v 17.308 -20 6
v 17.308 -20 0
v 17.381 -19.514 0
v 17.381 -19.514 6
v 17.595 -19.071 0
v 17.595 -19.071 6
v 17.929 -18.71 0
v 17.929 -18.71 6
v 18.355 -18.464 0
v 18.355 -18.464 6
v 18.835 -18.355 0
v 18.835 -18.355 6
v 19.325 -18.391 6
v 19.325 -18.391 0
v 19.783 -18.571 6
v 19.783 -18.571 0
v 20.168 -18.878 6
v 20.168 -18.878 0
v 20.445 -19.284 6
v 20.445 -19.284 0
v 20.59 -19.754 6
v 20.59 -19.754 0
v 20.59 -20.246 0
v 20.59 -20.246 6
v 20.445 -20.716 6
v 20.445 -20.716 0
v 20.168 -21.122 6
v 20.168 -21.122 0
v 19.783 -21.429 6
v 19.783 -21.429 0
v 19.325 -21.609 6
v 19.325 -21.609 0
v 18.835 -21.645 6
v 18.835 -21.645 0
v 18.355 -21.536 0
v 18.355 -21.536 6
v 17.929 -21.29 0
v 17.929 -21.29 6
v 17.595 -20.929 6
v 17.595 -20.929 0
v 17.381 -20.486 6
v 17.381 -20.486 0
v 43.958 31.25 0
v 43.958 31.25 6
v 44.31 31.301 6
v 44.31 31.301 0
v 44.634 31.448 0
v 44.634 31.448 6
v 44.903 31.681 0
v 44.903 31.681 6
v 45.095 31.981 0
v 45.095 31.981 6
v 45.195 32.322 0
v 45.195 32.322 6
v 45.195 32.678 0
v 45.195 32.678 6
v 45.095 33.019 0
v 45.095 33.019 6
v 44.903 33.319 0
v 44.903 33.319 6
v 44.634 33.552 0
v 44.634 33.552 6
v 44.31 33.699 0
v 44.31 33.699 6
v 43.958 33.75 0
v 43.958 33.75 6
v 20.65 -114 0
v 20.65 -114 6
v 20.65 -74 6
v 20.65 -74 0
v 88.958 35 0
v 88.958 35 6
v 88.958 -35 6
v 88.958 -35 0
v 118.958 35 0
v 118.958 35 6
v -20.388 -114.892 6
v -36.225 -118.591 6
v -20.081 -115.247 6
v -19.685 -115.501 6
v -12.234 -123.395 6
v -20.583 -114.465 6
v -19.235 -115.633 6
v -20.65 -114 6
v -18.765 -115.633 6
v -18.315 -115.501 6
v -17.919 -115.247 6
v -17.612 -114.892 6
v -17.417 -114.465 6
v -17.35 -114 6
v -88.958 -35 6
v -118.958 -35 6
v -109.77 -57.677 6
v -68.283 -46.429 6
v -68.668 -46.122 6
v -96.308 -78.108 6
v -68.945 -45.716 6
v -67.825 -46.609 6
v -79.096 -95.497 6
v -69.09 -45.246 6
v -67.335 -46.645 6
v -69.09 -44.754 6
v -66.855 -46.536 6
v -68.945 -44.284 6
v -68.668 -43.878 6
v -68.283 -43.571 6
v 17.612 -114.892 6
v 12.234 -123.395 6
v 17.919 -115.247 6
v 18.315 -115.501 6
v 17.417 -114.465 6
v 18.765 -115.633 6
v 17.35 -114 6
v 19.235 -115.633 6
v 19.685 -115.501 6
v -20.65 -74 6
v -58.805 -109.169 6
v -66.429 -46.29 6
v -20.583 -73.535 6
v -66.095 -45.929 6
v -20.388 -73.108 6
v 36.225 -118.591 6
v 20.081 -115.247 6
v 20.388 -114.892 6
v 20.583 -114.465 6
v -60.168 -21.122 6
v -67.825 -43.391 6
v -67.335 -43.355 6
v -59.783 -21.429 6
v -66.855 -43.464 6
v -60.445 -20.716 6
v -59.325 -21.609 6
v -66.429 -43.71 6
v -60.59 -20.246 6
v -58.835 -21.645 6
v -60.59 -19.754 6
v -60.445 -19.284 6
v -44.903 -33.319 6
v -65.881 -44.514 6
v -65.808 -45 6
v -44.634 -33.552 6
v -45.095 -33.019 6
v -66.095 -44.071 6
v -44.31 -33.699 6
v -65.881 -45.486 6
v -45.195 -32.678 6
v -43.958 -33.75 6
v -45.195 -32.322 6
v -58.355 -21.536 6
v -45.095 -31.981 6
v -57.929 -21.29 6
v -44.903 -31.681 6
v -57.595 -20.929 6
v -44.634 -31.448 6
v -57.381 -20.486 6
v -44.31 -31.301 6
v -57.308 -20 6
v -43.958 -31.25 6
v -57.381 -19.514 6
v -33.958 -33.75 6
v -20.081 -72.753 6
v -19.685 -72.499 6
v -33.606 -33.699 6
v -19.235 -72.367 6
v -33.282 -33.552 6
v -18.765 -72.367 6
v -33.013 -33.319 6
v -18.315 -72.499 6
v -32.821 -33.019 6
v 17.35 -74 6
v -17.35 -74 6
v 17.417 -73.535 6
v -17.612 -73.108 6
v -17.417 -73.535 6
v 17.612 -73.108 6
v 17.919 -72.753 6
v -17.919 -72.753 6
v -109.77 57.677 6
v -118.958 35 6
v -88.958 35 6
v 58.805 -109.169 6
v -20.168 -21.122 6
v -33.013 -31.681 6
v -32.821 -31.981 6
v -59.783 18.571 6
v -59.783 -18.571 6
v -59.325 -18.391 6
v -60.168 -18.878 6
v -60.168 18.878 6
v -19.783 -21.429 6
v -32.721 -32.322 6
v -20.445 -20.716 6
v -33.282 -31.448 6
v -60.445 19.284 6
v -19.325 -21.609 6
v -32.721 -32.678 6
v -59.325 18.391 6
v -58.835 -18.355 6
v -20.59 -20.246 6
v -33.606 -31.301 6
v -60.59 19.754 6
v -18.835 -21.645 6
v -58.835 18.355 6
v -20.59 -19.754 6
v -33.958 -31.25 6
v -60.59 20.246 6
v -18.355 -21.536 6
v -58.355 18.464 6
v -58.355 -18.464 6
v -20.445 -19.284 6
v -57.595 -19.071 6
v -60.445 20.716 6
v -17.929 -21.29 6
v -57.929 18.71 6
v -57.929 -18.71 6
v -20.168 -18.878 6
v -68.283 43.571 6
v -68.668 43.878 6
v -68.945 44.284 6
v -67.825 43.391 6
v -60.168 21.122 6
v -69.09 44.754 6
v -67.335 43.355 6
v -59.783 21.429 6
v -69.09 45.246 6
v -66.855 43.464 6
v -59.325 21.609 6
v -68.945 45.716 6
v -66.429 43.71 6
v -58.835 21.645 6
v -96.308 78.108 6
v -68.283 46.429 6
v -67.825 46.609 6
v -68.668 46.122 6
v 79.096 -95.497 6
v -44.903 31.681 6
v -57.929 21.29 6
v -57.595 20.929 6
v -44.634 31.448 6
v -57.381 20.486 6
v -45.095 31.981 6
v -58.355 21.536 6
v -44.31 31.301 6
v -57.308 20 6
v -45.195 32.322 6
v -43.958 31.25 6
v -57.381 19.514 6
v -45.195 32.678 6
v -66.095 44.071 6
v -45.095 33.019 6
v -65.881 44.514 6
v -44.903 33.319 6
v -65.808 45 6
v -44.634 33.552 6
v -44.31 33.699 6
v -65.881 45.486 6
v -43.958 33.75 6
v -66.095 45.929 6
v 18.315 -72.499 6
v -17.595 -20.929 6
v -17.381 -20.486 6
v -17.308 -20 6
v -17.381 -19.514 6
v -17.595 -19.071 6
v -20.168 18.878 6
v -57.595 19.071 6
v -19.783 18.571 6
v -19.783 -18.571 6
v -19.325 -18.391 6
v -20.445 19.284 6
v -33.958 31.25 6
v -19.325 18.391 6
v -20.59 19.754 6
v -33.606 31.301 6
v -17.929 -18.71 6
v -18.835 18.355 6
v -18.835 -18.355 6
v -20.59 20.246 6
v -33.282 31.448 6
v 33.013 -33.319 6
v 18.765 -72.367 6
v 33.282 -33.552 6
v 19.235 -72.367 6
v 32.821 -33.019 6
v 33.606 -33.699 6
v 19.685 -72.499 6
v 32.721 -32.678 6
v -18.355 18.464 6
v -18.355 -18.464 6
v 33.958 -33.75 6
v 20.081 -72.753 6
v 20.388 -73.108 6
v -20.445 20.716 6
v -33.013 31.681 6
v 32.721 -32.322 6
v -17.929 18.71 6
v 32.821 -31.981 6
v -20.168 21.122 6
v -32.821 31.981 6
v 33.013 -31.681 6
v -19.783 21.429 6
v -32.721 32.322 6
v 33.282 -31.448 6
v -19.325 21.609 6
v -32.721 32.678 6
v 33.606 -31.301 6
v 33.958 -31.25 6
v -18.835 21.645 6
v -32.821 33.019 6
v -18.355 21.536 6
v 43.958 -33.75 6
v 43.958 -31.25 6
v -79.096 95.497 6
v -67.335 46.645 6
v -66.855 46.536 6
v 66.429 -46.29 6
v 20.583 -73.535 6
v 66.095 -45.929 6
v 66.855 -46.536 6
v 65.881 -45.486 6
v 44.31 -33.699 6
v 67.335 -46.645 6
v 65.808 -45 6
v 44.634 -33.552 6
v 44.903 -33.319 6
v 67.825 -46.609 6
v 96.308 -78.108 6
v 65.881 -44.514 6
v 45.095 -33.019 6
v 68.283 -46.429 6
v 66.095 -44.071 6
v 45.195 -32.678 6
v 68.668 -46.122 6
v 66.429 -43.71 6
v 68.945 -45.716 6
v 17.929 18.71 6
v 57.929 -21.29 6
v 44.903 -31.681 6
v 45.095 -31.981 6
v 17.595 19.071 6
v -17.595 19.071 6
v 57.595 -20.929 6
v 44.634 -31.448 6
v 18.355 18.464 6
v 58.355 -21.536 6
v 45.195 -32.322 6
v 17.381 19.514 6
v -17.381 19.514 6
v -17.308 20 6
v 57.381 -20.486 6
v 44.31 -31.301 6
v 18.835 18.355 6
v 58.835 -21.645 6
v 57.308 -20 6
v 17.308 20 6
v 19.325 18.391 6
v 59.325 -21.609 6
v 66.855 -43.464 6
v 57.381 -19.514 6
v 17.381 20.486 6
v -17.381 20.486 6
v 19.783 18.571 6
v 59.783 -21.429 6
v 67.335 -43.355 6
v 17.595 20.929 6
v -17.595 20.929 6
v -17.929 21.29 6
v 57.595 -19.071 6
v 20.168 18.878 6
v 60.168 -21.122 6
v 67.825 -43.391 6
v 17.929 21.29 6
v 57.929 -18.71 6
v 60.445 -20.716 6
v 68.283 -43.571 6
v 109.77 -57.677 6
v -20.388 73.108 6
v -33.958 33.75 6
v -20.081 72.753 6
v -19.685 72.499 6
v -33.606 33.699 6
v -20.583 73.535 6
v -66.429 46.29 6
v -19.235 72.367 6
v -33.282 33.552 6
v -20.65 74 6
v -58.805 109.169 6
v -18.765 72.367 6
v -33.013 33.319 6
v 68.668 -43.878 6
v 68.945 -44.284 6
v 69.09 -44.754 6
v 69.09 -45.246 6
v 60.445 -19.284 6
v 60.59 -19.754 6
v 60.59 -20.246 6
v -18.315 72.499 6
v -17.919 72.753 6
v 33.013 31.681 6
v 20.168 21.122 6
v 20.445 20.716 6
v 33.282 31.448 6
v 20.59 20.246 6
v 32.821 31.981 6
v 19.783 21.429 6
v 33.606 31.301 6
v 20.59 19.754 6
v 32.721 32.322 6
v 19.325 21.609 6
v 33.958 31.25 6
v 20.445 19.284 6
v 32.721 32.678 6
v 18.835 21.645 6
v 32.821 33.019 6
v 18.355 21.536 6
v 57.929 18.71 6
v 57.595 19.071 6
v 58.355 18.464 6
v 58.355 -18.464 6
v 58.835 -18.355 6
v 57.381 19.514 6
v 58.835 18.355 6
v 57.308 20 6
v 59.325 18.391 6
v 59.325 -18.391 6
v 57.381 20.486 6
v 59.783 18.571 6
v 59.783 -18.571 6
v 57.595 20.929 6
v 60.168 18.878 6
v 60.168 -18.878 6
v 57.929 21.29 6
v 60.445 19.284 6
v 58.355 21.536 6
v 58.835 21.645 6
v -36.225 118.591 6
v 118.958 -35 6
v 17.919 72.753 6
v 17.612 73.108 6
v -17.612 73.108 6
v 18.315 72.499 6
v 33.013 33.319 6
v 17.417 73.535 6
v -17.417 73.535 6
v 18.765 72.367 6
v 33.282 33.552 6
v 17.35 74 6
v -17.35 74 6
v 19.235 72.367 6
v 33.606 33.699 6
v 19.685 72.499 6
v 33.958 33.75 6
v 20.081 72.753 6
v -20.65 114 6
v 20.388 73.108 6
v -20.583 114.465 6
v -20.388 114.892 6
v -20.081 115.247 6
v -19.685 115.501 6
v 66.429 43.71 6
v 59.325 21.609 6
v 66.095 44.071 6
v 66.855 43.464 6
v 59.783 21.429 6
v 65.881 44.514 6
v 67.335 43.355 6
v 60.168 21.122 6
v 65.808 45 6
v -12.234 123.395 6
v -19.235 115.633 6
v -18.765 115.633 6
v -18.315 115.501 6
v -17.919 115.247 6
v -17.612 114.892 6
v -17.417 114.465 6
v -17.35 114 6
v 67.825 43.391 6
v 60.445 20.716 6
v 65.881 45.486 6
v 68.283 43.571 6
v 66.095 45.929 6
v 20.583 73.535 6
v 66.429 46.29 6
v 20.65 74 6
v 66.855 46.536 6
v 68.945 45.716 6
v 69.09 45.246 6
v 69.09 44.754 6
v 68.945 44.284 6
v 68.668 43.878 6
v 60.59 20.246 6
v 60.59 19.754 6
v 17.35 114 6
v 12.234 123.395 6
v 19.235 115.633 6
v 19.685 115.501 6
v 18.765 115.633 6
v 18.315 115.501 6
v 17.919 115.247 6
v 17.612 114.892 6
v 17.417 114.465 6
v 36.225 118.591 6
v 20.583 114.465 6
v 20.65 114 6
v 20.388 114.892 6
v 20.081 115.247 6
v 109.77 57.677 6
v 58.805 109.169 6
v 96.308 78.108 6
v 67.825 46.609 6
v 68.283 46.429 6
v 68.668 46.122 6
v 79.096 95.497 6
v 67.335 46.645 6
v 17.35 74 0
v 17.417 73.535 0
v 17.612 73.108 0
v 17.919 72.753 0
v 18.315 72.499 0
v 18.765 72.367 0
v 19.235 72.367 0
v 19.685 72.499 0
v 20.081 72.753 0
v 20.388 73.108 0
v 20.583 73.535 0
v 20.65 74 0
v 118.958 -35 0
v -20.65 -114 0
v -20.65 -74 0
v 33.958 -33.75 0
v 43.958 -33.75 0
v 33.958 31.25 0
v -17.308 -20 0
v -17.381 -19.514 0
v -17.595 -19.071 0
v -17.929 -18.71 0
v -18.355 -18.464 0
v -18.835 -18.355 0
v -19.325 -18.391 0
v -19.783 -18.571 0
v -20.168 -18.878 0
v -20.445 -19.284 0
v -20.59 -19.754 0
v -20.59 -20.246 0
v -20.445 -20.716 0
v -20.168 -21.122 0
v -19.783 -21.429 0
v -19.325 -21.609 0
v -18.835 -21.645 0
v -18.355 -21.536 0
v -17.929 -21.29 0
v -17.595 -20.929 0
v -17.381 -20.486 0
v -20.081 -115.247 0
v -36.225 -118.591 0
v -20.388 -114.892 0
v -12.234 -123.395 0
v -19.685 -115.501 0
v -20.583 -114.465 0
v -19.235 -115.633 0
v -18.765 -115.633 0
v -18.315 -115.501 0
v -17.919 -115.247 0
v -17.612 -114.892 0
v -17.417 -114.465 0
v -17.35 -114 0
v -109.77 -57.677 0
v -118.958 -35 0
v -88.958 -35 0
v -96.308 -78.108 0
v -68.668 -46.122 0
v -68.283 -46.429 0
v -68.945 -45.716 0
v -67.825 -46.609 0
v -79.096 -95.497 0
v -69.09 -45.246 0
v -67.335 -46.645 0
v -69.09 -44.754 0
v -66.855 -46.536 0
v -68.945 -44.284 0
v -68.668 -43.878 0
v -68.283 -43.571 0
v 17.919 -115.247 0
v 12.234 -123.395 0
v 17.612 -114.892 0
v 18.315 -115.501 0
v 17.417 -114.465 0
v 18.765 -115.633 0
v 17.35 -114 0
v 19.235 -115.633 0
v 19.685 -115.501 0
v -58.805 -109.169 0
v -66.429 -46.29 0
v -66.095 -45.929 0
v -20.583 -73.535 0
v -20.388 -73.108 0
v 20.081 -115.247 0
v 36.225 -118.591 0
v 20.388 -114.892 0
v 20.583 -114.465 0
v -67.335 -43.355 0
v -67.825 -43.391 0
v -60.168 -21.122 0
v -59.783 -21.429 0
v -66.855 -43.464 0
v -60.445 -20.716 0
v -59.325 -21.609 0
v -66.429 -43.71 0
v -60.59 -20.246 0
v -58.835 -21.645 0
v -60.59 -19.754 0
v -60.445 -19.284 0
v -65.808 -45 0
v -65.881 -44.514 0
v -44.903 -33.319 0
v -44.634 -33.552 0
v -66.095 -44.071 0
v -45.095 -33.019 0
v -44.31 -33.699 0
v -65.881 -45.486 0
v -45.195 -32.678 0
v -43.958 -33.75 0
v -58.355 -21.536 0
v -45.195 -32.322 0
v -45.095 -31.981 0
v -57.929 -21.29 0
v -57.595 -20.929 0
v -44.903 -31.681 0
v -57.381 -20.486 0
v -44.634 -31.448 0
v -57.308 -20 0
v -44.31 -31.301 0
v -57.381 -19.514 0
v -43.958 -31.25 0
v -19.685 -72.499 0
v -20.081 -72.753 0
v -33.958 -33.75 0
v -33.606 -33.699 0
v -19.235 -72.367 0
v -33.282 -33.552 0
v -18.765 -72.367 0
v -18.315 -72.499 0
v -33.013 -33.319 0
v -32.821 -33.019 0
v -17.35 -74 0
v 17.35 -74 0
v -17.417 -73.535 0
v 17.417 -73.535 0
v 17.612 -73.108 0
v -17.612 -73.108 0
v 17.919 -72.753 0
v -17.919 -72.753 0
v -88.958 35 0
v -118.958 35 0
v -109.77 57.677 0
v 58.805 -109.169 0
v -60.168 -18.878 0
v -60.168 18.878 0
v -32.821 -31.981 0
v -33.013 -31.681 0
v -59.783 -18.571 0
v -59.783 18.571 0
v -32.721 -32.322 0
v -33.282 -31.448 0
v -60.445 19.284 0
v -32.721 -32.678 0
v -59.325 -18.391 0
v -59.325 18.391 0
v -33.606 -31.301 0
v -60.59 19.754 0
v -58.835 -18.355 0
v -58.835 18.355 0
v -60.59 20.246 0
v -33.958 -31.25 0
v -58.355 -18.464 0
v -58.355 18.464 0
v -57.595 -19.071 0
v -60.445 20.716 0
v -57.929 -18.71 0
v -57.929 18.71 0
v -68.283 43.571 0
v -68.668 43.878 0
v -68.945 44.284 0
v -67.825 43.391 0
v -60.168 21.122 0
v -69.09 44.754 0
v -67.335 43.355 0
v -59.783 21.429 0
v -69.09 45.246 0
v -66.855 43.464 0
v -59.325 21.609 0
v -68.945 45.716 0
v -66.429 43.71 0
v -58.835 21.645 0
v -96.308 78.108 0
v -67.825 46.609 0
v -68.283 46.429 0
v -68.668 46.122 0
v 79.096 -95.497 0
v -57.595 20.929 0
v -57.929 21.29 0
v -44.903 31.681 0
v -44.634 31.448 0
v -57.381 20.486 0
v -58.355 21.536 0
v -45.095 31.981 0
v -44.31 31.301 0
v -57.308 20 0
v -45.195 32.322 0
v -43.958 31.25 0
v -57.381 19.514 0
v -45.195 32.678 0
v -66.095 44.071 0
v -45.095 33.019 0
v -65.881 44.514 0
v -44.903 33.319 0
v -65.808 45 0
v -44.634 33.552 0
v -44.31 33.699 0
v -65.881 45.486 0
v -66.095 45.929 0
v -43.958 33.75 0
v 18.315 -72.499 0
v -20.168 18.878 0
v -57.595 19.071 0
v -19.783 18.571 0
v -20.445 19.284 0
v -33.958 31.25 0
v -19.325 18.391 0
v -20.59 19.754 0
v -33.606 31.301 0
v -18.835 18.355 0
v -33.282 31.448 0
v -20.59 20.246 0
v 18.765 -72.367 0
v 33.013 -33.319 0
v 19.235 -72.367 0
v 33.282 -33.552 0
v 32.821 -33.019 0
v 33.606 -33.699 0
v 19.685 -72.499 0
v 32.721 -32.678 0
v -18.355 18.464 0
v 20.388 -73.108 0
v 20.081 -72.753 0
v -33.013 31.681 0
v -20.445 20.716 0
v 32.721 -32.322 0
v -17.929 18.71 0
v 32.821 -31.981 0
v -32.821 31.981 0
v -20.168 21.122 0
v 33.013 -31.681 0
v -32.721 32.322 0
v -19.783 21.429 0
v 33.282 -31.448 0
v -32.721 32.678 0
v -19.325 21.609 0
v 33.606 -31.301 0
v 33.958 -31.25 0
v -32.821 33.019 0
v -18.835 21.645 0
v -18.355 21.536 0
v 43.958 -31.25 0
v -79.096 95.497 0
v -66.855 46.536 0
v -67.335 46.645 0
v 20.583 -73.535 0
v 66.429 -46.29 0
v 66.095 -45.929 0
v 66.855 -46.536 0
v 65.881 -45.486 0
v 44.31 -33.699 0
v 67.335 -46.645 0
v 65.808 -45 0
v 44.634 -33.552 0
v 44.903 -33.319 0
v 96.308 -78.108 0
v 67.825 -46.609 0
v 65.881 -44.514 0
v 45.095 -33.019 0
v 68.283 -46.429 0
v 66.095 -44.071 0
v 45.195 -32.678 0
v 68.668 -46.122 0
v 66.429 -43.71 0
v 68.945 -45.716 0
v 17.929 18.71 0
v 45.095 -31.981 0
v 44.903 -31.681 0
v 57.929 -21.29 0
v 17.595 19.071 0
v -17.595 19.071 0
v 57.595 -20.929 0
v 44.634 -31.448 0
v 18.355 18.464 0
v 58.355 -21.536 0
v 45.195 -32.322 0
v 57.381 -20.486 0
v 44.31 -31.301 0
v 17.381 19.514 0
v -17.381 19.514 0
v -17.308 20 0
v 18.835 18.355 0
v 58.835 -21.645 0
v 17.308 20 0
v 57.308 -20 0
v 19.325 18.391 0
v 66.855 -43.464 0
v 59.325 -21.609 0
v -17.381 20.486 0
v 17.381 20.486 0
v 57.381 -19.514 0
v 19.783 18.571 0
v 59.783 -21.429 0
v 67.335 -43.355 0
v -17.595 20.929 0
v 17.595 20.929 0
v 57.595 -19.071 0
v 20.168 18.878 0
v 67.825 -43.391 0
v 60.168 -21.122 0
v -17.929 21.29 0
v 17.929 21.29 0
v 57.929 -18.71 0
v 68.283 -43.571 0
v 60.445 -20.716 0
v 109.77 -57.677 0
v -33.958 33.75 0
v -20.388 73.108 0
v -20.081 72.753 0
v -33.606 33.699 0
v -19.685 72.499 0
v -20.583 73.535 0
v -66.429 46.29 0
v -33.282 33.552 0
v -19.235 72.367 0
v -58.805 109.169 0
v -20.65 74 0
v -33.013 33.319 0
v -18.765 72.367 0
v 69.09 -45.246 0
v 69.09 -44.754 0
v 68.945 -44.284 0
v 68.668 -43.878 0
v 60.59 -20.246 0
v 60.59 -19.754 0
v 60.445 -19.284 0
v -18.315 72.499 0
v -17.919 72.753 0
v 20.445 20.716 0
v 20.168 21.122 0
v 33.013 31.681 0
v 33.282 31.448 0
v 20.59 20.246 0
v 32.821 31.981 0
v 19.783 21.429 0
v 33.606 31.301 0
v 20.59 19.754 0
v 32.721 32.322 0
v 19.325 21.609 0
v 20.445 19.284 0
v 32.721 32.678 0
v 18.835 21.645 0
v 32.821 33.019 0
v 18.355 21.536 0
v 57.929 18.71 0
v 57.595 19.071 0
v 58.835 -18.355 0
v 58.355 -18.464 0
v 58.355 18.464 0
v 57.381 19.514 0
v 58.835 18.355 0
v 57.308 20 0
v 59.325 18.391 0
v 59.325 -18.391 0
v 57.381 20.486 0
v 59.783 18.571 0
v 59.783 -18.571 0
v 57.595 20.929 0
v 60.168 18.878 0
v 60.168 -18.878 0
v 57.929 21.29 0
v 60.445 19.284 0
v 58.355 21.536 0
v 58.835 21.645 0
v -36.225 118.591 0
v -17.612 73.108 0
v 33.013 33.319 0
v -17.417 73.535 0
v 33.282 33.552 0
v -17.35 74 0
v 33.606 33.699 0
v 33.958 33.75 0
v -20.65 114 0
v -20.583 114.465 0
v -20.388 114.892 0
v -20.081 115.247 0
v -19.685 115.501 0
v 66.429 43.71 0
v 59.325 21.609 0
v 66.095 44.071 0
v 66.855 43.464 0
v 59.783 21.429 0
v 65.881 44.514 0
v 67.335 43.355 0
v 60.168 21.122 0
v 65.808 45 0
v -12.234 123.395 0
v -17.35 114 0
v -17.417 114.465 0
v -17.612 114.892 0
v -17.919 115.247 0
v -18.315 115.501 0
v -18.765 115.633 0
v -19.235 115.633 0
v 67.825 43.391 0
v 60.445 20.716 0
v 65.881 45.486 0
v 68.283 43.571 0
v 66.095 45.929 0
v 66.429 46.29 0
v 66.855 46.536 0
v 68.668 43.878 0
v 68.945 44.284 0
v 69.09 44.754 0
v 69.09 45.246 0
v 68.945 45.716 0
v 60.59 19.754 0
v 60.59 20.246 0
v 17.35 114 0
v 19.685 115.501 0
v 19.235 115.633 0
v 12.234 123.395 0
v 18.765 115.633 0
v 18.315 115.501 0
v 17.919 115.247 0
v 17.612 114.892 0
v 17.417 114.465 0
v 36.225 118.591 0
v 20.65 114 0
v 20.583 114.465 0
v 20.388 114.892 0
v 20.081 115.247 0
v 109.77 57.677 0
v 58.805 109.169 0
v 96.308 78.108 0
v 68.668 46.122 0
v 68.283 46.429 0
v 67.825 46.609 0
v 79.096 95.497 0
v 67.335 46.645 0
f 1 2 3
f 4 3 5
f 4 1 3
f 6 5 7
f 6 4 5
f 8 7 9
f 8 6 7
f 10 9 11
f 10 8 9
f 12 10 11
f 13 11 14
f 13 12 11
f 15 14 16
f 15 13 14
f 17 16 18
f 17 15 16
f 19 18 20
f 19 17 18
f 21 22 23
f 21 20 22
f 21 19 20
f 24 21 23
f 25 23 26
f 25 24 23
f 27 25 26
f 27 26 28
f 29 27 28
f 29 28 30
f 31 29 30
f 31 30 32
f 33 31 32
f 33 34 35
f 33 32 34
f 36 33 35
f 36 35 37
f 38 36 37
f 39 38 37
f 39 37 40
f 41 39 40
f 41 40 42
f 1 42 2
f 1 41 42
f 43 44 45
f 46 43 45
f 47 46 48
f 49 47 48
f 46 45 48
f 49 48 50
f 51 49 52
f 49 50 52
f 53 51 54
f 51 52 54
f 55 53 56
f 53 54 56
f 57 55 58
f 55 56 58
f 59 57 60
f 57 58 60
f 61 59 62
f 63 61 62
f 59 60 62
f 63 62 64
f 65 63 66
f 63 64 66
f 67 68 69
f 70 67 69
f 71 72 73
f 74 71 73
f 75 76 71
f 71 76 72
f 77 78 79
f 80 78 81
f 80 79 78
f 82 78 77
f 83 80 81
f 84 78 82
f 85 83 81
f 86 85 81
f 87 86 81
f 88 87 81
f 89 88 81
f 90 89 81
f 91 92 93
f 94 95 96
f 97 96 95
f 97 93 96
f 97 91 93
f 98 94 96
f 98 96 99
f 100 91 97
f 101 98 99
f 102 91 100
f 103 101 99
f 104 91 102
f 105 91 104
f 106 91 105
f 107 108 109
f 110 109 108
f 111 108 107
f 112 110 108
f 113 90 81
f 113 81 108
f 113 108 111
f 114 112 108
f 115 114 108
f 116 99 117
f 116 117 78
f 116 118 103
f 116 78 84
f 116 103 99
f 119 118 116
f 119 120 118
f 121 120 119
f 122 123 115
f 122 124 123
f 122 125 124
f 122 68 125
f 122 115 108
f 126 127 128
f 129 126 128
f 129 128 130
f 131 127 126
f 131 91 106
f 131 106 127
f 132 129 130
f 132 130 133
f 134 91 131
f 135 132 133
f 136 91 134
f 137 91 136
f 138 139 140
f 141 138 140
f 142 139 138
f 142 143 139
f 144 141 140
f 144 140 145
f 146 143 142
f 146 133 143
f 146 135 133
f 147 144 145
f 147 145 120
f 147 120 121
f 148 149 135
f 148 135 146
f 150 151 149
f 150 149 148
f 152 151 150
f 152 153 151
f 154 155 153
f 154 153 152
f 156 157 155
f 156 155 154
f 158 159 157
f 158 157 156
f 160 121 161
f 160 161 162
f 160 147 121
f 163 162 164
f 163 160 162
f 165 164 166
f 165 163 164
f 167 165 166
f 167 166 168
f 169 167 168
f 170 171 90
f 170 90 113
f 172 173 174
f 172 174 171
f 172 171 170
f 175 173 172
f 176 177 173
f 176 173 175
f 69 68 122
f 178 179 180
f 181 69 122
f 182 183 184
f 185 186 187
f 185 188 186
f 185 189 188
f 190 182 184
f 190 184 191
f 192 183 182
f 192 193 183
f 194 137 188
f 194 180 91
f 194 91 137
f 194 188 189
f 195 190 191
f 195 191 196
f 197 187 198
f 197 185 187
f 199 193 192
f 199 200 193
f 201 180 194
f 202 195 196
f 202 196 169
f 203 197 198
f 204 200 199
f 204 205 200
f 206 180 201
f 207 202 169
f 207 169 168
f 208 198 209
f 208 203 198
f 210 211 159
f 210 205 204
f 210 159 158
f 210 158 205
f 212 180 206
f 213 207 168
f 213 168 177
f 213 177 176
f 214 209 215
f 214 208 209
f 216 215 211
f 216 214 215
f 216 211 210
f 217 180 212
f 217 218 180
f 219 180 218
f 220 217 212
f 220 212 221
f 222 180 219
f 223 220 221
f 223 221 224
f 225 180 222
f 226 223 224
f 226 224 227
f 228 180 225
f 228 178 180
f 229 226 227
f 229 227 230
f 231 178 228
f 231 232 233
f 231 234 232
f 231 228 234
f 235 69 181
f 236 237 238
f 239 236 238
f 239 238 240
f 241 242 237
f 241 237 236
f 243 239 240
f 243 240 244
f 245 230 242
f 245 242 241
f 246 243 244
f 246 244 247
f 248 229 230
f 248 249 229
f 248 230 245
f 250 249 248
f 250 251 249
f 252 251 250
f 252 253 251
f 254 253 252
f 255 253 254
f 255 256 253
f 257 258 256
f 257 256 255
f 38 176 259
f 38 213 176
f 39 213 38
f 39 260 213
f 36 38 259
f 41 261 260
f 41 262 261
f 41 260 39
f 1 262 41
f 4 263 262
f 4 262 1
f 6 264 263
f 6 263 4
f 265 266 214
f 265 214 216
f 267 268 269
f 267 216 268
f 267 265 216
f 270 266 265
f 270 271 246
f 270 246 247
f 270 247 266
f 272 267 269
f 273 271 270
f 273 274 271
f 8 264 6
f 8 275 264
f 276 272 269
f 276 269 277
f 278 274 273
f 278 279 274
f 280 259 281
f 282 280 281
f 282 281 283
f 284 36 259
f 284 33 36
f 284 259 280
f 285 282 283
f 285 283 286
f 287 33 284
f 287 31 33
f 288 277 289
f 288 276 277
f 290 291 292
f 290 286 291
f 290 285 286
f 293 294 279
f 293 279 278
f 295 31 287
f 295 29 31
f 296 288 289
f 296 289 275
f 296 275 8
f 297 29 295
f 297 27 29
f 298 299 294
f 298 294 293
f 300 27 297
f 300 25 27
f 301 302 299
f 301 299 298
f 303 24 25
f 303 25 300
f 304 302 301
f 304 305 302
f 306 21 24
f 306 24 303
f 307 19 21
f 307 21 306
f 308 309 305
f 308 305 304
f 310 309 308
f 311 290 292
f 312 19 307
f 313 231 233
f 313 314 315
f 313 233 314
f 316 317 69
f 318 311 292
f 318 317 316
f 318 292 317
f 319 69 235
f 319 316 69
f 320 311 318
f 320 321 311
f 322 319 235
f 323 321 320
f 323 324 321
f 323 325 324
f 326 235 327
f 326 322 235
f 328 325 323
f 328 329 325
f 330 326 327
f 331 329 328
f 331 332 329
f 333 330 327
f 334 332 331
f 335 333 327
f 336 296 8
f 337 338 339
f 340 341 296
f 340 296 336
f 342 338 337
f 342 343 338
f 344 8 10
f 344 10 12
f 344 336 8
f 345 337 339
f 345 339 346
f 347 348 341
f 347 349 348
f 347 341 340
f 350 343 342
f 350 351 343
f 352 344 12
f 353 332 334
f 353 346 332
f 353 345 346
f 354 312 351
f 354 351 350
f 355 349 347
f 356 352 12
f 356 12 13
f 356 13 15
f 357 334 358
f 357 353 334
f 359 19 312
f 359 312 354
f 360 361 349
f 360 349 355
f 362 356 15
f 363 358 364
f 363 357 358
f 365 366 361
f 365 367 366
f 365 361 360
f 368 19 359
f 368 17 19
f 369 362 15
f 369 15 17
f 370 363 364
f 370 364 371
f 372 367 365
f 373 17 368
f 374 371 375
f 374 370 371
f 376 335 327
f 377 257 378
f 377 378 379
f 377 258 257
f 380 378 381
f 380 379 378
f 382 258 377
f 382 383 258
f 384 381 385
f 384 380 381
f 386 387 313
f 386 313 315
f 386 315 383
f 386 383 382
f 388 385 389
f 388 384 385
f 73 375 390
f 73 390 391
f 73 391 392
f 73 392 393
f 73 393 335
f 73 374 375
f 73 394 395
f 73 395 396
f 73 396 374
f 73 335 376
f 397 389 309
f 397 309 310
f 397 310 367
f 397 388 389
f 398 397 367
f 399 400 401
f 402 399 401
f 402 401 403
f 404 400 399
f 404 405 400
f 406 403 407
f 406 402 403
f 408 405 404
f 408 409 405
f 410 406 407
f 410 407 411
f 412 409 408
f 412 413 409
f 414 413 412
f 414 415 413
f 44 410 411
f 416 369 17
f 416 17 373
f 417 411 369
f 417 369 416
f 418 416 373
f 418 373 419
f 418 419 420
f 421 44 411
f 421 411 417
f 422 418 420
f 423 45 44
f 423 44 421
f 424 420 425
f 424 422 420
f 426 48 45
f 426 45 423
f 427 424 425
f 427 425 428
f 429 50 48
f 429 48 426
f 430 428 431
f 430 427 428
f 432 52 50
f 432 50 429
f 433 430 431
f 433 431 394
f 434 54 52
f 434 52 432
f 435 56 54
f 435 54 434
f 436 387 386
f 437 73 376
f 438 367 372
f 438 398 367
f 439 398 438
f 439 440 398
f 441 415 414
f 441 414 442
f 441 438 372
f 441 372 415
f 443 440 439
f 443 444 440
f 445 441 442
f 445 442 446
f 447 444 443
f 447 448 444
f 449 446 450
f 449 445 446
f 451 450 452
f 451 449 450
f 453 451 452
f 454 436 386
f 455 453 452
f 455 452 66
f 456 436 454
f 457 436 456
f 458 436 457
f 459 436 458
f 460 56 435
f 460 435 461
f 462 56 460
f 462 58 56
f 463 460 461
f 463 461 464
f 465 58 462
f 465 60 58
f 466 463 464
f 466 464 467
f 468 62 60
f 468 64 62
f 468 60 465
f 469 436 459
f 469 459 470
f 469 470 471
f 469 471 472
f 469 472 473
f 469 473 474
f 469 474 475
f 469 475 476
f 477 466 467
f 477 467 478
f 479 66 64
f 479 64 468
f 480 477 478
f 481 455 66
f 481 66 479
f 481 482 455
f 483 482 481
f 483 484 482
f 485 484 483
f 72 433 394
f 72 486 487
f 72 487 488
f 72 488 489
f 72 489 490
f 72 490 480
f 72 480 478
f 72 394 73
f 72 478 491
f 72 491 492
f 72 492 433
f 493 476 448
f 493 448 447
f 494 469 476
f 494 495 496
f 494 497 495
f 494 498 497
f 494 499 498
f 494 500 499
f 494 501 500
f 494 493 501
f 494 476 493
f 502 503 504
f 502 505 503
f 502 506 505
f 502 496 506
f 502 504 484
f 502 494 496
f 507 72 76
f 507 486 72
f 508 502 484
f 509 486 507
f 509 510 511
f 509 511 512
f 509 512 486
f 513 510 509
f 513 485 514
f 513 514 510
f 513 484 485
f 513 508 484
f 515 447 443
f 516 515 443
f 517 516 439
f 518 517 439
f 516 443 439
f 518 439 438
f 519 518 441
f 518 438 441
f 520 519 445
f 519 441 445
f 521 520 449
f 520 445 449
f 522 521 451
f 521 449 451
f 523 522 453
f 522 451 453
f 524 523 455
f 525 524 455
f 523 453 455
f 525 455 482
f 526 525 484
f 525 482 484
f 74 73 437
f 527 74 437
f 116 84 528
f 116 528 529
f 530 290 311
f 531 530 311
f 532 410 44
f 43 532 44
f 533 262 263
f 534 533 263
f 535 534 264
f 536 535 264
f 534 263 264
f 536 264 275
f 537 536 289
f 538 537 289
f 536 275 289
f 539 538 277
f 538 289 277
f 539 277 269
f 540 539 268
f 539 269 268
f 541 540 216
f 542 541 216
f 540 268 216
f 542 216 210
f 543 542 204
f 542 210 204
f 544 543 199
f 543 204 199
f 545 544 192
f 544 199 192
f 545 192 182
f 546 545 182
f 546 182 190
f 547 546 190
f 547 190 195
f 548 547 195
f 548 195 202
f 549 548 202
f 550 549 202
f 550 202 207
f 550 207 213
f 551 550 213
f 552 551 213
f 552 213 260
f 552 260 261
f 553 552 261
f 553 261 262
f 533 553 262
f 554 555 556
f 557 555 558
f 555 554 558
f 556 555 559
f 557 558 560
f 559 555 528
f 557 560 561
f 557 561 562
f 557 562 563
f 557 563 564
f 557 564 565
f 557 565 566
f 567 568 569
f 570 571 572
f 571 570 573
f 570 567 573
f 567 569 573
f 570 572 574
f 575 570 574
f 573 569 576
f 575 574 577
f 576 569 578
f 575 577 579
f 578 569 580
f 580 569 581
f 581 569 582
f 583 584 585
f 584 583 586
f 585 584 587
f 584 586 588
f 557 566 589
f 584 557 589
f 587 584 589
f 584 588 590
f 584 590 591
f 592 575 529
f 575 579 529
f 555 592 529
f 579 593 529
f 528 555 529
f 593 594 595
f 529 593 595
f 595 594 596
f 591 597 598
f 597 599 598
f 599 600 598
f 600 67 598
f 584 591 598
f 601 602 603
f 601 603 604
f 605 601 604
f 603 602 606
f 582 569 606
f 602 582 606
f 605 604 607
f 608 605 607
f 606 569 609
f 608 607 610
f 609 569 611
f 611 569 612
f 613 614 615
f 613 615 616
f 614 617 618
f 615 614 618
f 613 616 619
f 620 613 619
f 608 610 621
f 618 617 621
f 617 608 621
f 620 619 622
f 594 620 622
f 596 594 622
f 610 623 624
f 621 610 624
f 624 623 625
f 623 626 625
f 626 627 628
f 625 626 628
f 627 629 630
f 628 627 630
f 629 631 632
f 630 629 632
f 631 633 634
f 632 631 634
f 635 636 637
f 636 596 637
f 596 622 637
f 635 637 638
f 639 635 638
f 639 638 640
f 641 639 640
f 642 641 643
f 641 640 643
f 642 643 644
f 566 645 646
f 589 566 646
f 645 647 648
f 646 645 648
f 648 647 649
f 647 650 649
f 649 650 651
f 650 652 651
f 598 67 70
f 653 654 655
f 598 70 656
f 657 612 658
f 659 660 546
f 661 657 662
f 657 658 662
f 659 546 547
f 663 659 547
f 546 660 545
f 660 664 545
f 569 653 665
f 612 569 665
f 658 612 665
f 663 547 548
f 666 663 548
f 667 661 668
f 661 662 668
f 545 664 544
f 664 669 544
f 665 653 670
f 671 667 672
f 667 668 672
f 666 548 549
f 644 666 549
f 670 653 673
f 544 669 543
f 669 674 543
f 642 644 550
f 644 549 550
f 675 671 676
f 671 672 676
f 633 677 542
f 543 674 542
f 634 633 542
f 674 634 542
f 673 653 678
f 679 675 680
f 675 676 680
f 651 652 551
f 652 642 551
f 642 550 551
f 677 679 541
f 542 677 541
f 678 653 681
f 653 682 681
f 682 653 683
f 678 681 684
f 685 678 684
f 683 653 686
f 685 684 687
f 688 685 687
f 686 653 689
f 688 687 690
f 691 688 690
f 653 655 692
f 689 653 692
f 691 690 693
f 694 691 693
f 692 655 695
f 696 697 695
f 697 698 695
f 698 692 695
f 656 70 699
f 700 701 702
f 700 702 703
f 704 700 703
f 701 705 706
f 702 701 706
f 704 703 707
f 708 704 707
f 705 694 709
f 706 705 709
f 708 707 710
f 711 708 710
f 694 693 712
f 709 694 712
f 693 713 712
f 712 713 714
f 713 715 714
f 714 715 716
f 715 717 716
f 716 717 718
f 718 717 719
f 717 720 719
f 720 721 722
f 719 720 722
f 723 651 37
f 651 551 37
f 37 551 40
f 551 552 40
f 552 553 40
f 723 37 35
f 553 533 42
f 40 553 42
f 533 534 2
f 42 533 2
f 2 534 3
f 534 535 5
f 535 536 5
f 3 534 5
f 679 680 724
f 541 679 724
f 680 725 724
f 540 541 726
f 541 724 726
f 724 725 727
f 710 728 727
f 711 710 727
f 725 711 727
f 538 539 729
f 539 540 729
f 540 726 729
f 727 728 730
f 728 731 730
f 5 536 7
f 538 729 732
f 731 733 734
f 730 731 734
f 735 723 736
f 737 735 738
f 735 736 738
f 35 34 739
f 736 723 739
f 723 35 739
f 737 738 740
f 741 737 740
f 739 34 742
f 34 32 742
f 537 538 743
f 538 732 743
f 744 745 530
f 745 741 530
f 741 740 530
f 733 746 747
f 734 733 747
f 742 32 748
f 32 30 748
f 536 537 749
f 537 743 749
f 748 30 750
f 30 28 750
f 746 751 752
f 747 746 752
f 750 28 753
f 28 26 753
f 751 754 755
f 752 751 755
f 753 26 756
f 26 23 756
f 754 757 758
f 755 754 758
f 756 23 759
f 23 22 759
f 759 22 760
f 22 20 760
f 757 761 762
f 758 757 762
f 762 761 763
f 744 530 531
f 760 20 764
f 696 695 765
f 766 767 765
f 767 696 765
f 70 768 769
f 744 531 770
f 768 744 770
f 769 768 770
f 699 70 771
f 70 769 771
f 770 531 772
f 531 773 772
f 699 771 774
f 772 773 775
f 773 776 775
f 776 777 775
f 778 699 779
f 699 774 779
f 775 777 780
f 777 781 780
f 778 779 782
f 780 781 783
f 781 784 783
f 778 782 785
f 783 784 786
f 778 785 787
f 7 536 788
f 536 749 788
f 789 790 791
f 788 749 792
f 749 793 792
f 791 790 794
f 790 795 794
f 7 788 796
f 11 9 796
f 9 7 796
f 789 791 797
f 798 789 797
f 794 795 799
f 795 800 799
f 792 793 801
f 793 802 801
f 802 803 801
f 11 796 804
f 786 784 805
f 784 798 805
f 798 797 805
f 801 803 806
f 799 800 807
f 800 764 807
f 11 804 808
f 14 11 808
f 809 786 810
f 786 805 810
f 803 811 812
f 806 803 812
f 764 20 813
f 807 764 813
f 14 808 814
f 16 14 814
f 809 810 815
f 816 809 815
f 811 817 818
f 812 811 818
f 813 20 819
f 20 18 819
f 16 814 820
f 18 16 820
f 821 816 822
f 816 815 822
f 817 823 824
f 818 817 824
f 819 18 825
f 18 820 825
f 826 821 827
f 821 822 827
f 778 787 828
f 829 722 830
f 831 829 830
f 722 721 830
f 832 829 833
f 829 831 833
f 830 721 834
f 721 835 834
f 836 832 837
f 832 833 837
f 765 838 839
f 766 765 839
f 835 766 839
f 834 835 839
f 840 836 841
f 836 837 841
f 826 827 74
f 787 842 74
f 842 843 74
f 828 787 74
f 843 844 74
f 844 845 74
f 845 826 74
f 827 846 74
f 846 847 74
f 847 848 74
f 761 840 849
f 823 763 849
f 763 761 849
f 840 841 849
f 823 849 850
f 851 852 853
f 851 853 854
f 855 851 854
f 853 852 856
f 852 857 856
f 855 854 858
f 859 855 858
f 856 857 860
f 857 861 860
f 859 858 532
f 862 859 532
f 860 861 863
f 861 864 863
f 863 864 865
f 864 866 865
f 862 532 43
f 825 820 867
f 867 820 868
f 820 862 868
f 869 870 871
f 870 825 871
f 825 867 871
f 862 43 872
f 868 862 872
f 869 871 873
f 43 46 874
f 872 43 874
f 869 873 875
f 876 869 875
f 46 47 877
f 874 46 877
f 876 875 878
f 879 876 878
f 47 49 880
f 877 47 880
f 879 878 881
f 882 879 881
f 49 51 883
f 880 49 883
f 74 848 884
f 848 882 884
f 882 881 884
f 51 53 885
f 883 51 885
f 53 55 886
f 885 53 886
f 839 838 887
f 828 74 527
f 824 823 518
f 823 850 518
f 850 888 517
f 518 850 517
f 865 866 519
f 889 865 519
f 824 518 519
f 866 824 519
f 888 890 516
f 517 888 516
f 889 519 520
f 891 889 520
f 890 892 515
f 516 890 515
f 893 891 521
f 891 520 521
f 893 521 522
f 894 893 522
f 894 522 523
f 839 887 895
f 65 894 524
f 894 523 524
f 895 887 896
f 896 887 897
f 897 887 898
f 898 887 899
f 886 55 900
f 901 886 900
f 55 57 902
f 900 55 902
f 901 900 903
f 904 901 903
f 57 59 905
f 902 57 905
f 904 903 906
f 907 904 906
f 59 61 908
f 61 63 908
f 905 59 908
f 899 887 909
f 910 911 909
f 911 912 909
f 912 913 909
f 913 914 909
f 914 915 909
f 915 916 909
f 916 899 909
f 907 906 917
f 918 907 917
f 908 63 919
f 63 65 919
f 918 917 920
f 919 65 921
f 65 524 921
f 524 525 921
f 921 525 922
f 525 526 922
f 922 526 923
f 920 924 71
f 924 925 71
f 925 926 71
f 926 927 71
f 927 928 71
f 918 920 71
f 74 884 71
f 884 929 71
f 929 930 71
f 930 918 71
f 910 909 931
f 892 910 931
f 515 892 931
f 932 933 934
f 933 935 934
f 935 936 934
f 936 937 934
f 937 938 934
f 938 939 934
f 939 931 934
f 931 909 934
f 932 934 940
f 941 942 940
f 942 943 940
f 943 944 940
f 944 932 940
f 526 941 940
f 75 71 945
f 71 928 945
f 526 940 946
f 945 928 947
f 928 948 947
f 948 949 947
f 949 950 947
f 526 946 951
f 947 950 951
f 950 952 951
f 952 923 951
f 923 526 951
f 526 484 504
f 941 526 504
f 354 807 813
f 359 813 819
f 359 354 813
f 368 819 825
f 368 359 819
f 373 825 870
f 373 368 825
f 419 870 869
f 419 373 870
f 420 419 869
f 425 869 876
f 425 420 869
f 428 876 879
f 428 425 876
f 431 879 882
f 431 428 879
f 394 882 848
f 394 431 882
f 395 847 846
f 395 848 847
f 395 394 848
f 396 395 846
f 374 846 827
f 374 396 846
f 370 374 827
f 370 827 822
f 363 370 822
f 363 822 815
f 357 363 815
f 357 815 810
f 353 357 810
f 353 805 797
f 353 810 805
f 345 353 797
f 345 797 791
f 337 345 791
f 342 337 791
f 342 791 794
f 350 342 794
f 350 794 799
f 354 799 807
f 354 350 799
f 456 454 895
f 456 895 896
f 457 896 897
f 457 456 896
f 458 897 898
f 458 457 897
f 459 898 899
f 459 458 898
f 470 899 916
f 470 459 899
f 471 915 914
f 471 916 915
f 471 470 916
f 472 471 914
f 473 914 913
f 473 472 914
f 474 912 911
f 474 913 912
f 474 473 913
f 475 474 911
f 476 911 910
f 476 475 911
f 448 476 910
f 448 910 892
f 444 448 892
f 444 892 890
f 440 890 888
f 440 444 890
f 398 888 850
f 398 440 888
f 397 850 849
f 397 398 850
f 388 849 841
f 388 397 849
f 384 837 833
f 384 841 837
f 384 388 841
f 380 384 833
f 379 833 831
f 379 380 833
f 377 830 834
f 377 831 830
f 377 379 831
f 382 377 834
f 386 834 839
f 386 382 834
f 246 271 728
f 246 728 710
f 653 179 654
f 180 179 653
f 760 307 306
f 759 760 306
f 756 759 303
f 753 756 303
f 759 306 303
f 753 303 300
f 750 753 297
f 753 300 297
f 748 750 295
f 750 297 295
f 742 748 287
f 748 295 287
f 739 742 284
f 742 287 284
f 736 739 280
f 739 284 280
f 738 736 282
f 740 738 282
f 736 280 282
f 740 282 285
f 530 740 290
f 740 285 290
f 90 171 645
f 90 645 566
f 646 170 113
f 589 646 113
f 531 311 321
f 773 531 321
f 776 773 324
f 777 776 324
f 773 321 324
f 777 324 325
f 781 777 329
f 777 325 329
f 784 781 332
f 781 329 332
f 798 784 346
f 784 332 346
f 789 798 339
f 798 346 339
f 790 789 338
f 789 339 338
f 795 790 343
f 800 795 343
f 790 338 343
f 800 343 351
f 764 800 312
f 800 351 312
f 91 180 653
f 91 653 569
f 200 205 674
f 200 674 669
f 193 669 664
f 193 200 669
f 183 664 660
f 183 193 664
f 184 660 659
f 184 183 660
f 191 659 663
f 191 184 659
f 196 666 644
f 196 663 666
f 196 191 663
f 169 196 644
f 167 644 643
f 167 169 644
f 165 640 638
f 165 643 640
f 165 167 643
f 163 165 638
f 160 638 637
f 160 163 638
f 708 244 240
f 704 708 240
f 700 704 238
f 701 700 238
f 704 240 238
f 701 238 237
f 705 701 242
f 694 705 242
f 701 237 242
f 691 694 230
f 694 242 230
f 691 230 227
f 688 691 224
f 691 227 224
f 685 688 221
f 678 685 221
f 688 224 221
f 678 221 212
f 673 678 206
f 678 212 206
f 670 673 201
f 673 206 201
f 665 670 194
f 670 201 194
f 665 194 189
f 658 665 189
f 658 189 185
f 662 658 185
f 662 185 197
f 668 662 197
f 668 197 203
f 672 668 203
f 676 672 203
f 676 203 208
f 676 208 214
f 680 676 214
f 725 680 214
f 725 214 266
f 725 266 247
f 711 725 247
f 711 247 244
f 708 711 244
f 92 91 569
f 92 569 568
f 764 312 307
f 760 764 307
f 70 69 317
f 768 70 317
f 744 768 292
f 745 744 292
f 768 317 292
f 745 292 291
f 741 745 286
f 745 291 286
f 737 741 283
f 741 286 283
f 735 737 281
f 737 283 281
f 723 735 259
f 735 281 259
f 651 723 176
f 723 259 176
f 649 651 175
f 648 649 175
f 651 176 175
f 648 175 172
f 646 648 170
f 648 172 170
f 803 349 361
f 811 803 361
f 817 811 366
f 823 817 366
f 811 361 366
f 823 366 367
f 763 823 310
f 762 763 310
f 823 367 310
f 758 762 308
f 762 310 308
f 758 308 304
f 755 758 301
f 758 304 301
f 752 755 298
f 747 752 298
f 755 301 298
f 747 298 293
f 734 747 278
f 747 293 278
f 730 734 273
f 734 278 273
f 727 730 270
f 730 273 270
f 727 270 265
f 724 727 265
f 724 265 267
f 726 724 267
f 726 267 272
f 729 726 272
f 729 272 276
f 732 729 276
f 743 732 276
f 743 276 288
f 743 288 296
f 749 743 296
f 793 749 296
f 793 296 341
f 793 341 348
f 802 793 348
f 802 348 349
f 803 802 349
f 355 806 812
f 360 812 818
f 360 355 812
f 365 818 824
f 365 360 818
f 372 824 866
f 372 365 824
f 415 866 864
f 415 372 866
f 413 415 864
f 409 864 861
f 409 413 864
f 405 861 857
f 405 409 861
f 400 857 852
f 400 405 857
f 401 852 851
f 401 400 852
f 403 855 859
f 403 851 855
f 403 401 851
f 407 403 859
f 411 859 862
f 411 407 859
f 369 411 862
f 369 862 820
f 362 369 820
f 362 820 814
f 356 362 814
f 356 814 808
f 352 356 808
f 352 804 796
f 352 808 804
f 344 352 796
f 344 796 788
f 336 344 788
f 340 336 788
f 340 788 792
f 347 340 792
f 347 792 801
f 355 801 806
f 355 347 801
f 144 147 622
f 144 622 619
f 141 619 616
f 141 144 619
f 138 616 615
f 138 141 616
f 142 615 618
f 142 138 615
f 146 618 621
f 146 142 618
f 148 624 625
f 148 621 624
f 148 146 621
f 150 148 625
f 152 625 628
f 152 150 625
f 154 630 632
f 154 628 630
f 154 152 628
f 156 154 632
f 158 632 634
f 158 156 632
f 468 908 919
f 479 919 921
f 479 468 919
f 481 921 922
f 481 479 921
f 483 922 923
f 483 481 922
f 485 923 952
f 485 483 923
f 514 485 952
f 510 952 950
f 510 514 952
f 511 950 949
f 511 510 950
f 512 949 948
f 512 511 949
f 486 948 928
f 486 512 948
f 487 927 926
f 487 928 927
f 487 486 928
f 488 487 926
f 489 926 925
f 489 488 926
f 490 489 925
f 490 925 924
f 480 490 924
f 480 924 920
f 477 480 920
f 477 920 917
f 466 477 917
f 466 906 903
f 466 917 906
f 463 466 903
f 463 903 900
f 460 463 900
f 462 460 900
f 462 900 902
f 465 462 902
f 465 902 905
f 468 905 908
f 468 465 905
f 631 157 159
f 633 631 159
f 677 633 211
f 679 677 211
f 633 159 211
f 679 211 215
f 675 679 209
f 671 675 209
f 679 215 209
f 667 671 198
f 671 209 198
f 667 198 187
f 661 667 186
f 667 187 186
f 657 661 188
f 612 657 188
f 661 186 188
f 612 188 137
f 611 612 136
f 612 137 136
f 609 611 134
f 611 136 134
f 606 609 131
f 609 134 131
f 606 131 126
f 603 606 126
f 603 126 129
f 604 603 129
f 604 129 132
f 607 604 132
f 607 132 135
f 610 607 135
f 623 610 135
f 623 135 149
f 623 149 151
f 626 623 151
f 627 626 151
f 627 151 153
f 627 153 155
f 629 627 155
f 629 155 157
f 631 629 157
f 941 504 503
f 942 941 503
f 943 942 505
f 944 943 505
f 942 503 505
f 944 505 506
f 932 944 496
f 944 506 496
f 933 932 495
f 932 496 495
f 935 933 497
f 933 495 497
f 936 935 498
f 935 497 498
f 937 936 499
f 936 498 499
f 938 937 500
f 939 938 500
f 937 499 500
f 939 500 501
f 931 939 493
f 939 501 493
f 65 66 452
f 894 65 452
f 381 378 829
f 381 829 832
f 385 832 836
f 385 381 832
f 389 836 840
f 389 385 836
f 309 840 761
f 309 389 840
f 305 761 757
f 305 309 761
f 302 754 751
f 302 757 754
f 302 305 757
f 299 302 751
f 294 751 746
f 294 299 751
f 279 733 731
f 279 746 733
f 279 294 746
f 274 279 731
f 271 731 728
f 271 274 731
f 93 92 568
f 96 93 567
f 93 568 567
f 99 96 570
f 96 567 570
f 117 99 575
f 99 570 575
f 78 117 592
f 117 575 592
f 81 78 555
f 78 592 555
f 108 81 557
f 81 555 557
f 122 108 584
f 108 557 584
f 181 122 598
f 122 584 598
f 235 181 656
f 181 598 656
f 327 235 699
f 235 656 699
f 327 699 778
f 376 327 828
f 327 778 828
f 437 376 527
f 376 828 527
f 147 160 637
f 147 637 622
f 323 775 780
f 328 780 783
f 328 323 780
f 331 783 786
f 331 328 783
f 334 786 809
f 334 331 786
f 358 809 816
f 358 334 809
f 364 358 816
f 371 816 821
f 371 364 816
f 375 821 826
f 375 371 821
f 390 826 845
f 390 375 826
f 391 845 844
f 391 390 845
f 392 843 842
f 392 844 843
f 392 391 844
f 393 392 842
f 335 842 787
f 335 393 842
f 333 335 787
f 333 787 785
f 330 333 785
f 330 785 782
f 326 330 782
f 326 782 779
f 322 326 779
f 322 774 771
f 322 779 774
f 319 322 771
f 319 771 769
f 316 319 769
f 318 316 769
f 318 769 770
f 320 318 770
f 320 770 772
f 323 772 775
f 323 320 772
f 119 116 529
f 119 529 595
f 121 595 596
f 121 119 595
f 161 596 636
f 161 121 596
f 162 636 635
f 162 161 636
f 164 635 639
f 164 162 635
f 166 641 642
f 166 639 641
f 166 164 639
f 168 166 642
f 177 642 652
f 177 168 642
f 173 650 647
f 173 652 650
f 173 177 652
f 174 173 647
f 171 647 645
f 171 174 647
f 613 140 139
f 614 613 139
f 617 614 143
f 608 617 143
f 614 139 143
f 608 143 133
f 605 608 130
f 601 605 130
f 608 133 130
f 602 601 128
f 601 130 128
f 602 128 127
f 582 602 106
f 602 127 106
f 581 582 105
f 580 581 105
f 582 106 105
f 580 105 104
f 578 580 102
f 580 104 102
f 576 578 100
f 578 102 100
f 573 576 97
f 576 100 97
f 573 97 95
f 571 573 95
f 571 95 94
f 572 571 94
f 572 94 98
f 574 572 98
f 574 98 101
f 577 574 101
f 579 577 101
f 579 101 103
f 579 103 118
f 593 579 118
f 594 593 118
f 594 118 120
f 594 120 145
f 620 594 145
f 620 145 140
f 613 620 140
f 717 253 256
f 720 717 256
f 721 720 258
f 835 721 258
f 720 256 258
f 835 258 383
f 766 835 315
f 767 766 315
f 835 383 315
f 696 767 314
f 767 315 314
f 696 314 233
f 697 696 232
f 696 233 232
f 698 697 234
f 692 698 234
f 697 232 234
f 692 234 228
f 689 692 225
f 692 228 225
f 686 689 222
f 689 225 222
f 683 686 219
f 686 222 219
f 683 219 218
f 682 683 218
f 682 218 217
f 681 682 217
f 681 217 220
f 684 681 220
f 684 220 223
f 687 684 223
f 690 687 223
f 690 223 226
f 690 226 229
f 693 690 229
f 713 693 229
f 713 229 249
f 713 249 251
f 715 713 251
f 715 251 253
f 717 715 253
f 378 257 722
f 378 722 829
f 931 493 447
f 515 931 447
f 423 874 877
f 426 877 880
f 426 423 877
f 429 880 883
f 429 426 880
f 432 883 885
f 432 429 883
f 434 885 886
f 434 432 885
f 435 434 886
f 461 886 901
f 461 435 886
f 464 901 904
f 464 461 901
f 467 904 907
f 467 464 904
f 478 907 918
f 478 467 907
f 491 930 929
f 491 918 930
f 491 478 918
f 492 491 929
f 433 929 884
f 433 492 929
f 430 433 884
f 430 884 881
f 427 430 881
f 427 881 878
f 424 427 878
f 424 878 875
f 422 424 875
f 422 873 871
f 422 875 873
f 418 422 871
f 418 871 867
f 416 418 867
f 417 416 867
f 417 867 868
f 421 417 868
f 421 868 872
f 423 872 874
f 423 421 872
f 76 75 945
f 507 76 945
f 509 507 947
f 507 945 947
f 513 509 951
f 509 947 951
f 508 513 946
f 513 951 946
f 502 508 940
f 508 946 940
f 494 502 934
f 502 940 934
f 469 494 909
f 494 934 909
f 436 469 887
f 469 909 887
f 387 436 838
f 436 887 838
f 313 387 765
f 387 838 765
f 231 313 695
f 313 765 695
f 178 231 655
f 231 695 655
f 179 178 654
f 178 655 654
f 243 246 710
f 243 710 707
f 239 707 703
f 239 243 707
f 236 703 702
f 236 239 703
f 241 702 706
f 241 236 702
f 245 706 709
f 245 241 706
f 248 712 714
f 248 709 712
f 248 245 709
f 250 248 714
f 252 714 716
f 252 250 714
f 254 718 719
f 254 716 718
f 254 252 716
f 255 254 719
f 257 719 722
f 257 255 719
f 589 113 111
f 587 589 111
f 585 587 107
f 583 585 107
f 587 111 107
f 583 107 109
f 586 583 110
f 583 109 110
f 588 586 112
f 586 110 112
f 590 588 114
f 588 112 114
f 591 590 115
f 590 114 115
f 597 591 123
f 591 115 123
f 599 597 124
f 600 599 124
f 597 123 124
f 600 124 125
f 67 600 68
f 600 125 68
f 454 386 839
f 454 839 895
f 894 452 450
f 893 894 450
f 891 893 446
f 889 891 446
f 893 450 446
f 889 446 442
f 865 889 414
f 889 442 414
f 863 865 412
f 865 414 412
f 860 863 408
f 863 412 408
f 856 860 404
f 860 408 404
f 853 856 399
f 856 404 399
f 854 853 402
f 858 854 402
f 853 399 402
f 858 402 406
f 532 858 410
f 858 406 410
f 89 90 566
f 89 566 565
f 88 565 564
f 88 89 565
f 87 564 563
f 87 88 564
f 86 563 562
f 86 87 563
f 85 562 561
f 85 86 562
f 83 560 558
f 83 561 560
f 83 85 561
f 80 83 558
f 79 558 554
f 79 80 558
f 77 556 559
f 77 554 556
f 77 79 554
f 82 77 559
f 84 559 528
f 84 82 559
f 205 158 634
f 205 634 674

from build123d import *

# Parameters (mm, degrees)
ESQUISSE1_R             = 124
BOSS_EXTRU_1_DEPTH      = 6
ENL_V_MAT_EXTRU_1_DEPTH = 176.465096244
ESQUISSE3_R             = 1.65
ENL_V_MAT_EXTRU_3_DEPTH = 172.938942651
ESQUISSE5_R             = 1.65
ENL_V_MAT_EXTRU_4_DEPTH = 172.938942651
ENL_V_MAT_EXTRU_5_DEPTH = 172.938942651
ENL_V_MAT_EXTRU_6_DEPTH = 172.938942651


with BuildPart() as part:
    # Esquisse1 → Boss.-Extru.1 (new body)
    with BuildSketch(Plane.XY):
        Circle(ESQUISSE1_R)
    extrude(amount=BOSS_EXTRU_1_DEPTH)

    # Esquisse2 → Enlèv. mat.-Extru.1 (cut, through all)
    with BuildSketch(Plane.XY.offset(6)):
        with BuildLine():
            Line((-118.957975773, 35), (-88.957975773, 35))
            Line((-88.957975773, 35), (-88.957975773, -35))
            Line((-88.957975773, -35), (-118.957975773, -35))
            ThreePointArc((-118.957975773, -35), (-124, 0), (-118.957975773, 35))
        make_face()
        with BuildLine():
            Line((118.957975773, 35), (88.957975773, 35))
            Line((88.957975773, 35), (88.957975773, -35))
            Line((88.957975773, -35), (118.957975773, -35))
            ThreePointArc((118.957975773, -35), (124, 0), (118.957975773, 35))
        make_face()
    extrude(amount=-ENL_V_MAT_EXTRU_1_DEPTH, mode=Mode.SUBTRACT)

    # Esquisse3 → Enlèv. mat.-Extru.3 (cut, through all)
    with BuildSketch(Plane.XY.offset(6)):
        with Locations((-58.957975773, 20)):
            Circle(ESQUISSE3_R)
        with Locations((-18.957975773, 20)):
            Circle(ESQUISSE3_R)
        with Locations((-18.957975773, -20)):
            Circle(ESQUISSE3_R)
        with Locations((-58.957975773, -20)):
            Circle(ESQUISSE3_R)
    enl_v_mat_extru_3 = extrude(amount=-ENL_V_MAT_EXTRU_3_DEPTH, mode=Mode.SUBTRACT)

    # Esquisse5 → Enlèv. mat.-Extru.4 (cut, through all)
    with BuildSketch(Plane.XY.offset(6)):
        with Locations((-67.457975773, 45)):
            Circle(ESQUISSE5_R)
        with Locations((-67.457975773, -45)):
            Circle(ESQUISSE5_R)
    enl_v_mat_extru_4 = extrude(amount=-ENL_V_MAT_EXTRU_4_DEPTH, mode=Mode.SUBTRACT)

    # Esquisse6 → Enlèv. mat.-Extru.5 (cut, through all)
    with BuildSketch(Plane.XY.offset(6)):
        with BuildLine():
            Line((-43.957975773, 33.75), (-33.957975773, 33.75))
            ThreePointArc((-33.957975773, 33.75), (-32.707975773, 32.5), (-33.957975773, 31.25))
            Line((-33.957975773, 31.25), (-43.957975773, 31.25))
            ThreePointArc((-43.957975773, 31.25), (-45.207975773, 32.5), (-43.957975773, 33.75))
        make_face()
        with BuildLine():
            Line((-43.957975773, -31.25), (-33.957975773, -31.25))
            ThreePointArc((-33.957975773, -31.25), (-32.707975773, -32.5), (-33.957975773, -33.75))
            Line((-33.957975773, -33.75), (-43.957975773, -33.75))
            ThreePointArc((-43.957975773, -33.75), (-45.207975773, -32.5), (-43.957975773, -31.25))
        make_face()
    enl_v_mat_extru_5 = extrude(amount=-ENL_V_MAT_EXTRU_5_DEPTH, mode=Mode.SUBTRACT)

    # Esquisse7 → Enlèv. mat.-Extru.6 (cut, through all)
    with BuildSketch(Plane.XY.offset(6)):
        with BuildLine():
            Line((-17.35, 114), (-17.35, 74))
            ThreePointArc((-17.35, 74), (-19, 72.35), (-20.65, 74))
            Line((-20.65, 74), (-20.65, 114))
            ThreePointArc((-20.65, 114), (-19, 115.65), (-17.35, 114))
        make_face()
        with BuildLine():
            Line((-17.35, -74), (-17.35, -114))
            ThreePointArc((-17.35, -114), (-19, -115.65), (-20.65, -114))
            Line((-20.65, -114), (-20.65, -74))
            ThreePointArc((-20.65, -74), (-19, -72.35), (-17.35, -74))
        make_face()
    enl_v_mat_extru_6 = extrude(amount=-ENL_V_MAT_EXTRU_6_DEPTH, mode=Mode.SUBTRACT)

    # Symétrie2: Enlèv. mat.-Extru.3, Enlèv. mat.-Extru.4, Enlèv. mat.-Extru.5, Enlèv. mat.-Extru.6 across plane
    add(enl_v_mat_extru_3.mirror(Plane(origin=(0, 0, 0), x_dir=(0, 0, 1), z_dir=(1, 0, 0))), mode=Mode.SUBTRACT)
    add(enl_v_mat_extru_4.mirror(Plane(origin=(0, 0, 0), x_dir=(0, 0, 1), z_dir=(1, 0, 0))), mode=Mode.SUBTRACT)
    add(enl_v_mat_extru_5.mirror(Plane(origin=(0, 0, 0), x_dir=(0, 0, 1), z_dir=(1, 0, 0))), mode=Mode.SUBTRACT)
    add(enl_v_mat_extru_6.mirror(Plane(origin=(0, 0, 0), x_dir=(0, 0, 1), z_dir=(1, 0, 0))), mode=Mode.SUBTRACT)


solid = part.part
